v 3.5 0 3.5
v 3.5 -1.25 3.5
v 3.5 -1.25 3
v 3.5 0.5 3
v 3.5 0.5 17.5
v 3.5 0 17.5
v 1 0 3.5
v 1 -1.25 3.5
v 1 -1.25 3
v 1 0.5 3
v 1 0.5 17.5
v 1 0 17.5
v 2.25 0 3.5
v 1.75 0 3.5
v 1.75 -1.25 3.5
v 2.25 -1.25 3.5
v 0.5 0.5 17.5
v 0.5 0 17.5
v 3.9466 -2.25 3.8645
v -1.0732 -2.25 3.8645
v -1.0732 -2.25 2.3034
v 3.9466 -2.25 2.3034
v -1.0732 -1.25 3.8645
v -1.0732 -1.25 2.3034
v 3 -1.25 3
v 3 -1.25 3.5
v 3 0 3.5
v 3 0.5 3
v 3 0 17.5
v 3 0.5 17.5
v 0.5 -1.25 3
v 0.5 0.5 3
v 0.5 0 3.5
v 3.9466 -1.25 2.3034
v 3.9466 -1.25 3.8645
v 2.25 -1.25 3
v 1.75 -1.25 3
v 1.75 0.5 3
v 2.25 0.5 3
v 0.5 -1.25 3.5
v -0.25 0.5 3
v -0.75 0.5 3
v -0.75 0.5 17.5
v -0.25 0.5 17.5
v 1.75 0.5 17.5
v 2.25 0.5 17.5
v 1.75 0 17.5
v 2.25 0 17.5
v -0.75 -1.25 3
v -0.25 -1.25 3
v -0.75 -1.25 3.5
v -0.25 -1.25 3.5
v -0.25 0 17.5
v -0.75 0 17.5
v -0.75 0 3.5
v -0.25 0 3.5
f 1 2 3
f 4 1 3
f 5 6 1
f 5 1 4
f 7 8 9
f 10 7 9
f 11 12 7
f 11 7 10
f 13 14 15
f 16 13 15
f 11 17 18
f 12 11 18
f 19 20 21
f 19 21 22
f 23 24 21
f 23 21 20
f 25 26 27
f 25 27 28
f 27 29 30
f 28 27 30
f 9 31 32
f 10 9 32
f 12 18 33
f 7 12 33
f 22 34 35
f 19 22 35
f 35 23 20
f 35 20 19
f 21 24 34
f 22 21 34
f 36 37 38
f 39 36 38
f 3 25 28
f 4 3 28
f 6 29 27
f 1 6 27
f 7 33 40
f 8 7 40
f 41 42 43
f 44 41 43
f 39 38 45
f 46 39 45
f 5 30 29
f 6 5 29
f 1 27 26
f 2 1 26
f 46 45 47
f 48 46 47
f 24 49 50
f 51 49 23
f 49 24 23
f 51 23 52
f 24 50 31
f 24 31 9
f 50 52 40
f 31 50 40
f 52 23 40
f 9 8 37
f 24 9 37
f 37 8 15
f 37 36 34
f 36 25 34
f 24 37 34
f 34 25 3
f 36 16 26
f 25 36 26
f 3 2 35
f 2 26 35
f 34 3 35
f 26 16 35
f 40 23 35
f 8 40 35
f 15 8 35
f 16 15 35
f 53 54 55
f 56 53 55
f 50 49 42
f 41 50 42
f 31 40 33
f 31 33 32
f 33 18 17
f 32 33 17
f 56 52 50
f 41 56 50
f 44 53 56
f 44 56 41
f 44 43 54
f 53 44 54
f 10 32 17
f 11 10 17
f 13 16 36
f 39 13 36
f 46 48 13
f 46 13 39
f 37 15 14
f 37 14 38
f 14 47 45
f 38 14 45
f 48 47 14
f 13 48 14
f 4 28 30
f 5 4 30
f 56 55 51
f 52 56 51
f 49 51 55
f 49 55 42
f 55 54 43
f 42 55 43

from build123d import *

# Parameters (mm, degrees)
SKETCH004_W  = 5.019769
SKETCH004_H  = 1.561025
PAD002_DEPTH = 1
PAD_DEPTH    = 0.5
PAD001_DEPTH = 0.5
PAD003_DEPTH = 0.5
PAD004_DEPTH = 0.5


with BuildPart() as part:
    # Sketch004 → Pad002 (new body)
    with BuildSketch(Plane.XZ.offset(1.25)):
        with Locations((1.436677, 3.083954)):
            Rectangle(SKETCH004_W, SKETCH004_H)
    extrude(amount=PAD002_DEPTH)

    # Sketch → Pad (join)
    with BuildSketch(Plane.YZ.offset(-0.75)):
        Polygon((-1.5, 3), (0.5, 3), (0.5, 17.5), (0, 17.5), (0, 3.5), (-1.5, 3.5), align=None)
    extrude(amount=PAD_DEPTH)

    # Sketch001 → Pad001 (join)
    with BuildSketch(Plane.YZ.offset(0.5)):
        Polygon((-1.5, 3), (0.5, 3), (0.5, 17.5), (0, 17.5), (0, 3.5), (-1.5, 3.5), align=None)
    extrude(amount=PAD001_DEPTH)

    # Sketch002 → Pad003 (join)
    with BuildSketch(Plane.YZ.offset(1.75)):
        Polygon((-1.5, 3), (0.5, 3), (0.5, 17.5), (0, 17.5), (0, 3.5), (-1.5, 3.5), align=None)
    extrude(amount=PAD003_DEPTH)

    # Sketch003 → Pad004 (join)
    with BuildSketch(Plane.YZ.offset(3)):
        Polygon((-1.5, 3), (0.5, 3), (0.5, 17.5), (0, 17.5), (0, 3.5), (-1.5, 3.5), align=None)
    extrude(amount=PAD004_DEPTH)


solid = part.part
